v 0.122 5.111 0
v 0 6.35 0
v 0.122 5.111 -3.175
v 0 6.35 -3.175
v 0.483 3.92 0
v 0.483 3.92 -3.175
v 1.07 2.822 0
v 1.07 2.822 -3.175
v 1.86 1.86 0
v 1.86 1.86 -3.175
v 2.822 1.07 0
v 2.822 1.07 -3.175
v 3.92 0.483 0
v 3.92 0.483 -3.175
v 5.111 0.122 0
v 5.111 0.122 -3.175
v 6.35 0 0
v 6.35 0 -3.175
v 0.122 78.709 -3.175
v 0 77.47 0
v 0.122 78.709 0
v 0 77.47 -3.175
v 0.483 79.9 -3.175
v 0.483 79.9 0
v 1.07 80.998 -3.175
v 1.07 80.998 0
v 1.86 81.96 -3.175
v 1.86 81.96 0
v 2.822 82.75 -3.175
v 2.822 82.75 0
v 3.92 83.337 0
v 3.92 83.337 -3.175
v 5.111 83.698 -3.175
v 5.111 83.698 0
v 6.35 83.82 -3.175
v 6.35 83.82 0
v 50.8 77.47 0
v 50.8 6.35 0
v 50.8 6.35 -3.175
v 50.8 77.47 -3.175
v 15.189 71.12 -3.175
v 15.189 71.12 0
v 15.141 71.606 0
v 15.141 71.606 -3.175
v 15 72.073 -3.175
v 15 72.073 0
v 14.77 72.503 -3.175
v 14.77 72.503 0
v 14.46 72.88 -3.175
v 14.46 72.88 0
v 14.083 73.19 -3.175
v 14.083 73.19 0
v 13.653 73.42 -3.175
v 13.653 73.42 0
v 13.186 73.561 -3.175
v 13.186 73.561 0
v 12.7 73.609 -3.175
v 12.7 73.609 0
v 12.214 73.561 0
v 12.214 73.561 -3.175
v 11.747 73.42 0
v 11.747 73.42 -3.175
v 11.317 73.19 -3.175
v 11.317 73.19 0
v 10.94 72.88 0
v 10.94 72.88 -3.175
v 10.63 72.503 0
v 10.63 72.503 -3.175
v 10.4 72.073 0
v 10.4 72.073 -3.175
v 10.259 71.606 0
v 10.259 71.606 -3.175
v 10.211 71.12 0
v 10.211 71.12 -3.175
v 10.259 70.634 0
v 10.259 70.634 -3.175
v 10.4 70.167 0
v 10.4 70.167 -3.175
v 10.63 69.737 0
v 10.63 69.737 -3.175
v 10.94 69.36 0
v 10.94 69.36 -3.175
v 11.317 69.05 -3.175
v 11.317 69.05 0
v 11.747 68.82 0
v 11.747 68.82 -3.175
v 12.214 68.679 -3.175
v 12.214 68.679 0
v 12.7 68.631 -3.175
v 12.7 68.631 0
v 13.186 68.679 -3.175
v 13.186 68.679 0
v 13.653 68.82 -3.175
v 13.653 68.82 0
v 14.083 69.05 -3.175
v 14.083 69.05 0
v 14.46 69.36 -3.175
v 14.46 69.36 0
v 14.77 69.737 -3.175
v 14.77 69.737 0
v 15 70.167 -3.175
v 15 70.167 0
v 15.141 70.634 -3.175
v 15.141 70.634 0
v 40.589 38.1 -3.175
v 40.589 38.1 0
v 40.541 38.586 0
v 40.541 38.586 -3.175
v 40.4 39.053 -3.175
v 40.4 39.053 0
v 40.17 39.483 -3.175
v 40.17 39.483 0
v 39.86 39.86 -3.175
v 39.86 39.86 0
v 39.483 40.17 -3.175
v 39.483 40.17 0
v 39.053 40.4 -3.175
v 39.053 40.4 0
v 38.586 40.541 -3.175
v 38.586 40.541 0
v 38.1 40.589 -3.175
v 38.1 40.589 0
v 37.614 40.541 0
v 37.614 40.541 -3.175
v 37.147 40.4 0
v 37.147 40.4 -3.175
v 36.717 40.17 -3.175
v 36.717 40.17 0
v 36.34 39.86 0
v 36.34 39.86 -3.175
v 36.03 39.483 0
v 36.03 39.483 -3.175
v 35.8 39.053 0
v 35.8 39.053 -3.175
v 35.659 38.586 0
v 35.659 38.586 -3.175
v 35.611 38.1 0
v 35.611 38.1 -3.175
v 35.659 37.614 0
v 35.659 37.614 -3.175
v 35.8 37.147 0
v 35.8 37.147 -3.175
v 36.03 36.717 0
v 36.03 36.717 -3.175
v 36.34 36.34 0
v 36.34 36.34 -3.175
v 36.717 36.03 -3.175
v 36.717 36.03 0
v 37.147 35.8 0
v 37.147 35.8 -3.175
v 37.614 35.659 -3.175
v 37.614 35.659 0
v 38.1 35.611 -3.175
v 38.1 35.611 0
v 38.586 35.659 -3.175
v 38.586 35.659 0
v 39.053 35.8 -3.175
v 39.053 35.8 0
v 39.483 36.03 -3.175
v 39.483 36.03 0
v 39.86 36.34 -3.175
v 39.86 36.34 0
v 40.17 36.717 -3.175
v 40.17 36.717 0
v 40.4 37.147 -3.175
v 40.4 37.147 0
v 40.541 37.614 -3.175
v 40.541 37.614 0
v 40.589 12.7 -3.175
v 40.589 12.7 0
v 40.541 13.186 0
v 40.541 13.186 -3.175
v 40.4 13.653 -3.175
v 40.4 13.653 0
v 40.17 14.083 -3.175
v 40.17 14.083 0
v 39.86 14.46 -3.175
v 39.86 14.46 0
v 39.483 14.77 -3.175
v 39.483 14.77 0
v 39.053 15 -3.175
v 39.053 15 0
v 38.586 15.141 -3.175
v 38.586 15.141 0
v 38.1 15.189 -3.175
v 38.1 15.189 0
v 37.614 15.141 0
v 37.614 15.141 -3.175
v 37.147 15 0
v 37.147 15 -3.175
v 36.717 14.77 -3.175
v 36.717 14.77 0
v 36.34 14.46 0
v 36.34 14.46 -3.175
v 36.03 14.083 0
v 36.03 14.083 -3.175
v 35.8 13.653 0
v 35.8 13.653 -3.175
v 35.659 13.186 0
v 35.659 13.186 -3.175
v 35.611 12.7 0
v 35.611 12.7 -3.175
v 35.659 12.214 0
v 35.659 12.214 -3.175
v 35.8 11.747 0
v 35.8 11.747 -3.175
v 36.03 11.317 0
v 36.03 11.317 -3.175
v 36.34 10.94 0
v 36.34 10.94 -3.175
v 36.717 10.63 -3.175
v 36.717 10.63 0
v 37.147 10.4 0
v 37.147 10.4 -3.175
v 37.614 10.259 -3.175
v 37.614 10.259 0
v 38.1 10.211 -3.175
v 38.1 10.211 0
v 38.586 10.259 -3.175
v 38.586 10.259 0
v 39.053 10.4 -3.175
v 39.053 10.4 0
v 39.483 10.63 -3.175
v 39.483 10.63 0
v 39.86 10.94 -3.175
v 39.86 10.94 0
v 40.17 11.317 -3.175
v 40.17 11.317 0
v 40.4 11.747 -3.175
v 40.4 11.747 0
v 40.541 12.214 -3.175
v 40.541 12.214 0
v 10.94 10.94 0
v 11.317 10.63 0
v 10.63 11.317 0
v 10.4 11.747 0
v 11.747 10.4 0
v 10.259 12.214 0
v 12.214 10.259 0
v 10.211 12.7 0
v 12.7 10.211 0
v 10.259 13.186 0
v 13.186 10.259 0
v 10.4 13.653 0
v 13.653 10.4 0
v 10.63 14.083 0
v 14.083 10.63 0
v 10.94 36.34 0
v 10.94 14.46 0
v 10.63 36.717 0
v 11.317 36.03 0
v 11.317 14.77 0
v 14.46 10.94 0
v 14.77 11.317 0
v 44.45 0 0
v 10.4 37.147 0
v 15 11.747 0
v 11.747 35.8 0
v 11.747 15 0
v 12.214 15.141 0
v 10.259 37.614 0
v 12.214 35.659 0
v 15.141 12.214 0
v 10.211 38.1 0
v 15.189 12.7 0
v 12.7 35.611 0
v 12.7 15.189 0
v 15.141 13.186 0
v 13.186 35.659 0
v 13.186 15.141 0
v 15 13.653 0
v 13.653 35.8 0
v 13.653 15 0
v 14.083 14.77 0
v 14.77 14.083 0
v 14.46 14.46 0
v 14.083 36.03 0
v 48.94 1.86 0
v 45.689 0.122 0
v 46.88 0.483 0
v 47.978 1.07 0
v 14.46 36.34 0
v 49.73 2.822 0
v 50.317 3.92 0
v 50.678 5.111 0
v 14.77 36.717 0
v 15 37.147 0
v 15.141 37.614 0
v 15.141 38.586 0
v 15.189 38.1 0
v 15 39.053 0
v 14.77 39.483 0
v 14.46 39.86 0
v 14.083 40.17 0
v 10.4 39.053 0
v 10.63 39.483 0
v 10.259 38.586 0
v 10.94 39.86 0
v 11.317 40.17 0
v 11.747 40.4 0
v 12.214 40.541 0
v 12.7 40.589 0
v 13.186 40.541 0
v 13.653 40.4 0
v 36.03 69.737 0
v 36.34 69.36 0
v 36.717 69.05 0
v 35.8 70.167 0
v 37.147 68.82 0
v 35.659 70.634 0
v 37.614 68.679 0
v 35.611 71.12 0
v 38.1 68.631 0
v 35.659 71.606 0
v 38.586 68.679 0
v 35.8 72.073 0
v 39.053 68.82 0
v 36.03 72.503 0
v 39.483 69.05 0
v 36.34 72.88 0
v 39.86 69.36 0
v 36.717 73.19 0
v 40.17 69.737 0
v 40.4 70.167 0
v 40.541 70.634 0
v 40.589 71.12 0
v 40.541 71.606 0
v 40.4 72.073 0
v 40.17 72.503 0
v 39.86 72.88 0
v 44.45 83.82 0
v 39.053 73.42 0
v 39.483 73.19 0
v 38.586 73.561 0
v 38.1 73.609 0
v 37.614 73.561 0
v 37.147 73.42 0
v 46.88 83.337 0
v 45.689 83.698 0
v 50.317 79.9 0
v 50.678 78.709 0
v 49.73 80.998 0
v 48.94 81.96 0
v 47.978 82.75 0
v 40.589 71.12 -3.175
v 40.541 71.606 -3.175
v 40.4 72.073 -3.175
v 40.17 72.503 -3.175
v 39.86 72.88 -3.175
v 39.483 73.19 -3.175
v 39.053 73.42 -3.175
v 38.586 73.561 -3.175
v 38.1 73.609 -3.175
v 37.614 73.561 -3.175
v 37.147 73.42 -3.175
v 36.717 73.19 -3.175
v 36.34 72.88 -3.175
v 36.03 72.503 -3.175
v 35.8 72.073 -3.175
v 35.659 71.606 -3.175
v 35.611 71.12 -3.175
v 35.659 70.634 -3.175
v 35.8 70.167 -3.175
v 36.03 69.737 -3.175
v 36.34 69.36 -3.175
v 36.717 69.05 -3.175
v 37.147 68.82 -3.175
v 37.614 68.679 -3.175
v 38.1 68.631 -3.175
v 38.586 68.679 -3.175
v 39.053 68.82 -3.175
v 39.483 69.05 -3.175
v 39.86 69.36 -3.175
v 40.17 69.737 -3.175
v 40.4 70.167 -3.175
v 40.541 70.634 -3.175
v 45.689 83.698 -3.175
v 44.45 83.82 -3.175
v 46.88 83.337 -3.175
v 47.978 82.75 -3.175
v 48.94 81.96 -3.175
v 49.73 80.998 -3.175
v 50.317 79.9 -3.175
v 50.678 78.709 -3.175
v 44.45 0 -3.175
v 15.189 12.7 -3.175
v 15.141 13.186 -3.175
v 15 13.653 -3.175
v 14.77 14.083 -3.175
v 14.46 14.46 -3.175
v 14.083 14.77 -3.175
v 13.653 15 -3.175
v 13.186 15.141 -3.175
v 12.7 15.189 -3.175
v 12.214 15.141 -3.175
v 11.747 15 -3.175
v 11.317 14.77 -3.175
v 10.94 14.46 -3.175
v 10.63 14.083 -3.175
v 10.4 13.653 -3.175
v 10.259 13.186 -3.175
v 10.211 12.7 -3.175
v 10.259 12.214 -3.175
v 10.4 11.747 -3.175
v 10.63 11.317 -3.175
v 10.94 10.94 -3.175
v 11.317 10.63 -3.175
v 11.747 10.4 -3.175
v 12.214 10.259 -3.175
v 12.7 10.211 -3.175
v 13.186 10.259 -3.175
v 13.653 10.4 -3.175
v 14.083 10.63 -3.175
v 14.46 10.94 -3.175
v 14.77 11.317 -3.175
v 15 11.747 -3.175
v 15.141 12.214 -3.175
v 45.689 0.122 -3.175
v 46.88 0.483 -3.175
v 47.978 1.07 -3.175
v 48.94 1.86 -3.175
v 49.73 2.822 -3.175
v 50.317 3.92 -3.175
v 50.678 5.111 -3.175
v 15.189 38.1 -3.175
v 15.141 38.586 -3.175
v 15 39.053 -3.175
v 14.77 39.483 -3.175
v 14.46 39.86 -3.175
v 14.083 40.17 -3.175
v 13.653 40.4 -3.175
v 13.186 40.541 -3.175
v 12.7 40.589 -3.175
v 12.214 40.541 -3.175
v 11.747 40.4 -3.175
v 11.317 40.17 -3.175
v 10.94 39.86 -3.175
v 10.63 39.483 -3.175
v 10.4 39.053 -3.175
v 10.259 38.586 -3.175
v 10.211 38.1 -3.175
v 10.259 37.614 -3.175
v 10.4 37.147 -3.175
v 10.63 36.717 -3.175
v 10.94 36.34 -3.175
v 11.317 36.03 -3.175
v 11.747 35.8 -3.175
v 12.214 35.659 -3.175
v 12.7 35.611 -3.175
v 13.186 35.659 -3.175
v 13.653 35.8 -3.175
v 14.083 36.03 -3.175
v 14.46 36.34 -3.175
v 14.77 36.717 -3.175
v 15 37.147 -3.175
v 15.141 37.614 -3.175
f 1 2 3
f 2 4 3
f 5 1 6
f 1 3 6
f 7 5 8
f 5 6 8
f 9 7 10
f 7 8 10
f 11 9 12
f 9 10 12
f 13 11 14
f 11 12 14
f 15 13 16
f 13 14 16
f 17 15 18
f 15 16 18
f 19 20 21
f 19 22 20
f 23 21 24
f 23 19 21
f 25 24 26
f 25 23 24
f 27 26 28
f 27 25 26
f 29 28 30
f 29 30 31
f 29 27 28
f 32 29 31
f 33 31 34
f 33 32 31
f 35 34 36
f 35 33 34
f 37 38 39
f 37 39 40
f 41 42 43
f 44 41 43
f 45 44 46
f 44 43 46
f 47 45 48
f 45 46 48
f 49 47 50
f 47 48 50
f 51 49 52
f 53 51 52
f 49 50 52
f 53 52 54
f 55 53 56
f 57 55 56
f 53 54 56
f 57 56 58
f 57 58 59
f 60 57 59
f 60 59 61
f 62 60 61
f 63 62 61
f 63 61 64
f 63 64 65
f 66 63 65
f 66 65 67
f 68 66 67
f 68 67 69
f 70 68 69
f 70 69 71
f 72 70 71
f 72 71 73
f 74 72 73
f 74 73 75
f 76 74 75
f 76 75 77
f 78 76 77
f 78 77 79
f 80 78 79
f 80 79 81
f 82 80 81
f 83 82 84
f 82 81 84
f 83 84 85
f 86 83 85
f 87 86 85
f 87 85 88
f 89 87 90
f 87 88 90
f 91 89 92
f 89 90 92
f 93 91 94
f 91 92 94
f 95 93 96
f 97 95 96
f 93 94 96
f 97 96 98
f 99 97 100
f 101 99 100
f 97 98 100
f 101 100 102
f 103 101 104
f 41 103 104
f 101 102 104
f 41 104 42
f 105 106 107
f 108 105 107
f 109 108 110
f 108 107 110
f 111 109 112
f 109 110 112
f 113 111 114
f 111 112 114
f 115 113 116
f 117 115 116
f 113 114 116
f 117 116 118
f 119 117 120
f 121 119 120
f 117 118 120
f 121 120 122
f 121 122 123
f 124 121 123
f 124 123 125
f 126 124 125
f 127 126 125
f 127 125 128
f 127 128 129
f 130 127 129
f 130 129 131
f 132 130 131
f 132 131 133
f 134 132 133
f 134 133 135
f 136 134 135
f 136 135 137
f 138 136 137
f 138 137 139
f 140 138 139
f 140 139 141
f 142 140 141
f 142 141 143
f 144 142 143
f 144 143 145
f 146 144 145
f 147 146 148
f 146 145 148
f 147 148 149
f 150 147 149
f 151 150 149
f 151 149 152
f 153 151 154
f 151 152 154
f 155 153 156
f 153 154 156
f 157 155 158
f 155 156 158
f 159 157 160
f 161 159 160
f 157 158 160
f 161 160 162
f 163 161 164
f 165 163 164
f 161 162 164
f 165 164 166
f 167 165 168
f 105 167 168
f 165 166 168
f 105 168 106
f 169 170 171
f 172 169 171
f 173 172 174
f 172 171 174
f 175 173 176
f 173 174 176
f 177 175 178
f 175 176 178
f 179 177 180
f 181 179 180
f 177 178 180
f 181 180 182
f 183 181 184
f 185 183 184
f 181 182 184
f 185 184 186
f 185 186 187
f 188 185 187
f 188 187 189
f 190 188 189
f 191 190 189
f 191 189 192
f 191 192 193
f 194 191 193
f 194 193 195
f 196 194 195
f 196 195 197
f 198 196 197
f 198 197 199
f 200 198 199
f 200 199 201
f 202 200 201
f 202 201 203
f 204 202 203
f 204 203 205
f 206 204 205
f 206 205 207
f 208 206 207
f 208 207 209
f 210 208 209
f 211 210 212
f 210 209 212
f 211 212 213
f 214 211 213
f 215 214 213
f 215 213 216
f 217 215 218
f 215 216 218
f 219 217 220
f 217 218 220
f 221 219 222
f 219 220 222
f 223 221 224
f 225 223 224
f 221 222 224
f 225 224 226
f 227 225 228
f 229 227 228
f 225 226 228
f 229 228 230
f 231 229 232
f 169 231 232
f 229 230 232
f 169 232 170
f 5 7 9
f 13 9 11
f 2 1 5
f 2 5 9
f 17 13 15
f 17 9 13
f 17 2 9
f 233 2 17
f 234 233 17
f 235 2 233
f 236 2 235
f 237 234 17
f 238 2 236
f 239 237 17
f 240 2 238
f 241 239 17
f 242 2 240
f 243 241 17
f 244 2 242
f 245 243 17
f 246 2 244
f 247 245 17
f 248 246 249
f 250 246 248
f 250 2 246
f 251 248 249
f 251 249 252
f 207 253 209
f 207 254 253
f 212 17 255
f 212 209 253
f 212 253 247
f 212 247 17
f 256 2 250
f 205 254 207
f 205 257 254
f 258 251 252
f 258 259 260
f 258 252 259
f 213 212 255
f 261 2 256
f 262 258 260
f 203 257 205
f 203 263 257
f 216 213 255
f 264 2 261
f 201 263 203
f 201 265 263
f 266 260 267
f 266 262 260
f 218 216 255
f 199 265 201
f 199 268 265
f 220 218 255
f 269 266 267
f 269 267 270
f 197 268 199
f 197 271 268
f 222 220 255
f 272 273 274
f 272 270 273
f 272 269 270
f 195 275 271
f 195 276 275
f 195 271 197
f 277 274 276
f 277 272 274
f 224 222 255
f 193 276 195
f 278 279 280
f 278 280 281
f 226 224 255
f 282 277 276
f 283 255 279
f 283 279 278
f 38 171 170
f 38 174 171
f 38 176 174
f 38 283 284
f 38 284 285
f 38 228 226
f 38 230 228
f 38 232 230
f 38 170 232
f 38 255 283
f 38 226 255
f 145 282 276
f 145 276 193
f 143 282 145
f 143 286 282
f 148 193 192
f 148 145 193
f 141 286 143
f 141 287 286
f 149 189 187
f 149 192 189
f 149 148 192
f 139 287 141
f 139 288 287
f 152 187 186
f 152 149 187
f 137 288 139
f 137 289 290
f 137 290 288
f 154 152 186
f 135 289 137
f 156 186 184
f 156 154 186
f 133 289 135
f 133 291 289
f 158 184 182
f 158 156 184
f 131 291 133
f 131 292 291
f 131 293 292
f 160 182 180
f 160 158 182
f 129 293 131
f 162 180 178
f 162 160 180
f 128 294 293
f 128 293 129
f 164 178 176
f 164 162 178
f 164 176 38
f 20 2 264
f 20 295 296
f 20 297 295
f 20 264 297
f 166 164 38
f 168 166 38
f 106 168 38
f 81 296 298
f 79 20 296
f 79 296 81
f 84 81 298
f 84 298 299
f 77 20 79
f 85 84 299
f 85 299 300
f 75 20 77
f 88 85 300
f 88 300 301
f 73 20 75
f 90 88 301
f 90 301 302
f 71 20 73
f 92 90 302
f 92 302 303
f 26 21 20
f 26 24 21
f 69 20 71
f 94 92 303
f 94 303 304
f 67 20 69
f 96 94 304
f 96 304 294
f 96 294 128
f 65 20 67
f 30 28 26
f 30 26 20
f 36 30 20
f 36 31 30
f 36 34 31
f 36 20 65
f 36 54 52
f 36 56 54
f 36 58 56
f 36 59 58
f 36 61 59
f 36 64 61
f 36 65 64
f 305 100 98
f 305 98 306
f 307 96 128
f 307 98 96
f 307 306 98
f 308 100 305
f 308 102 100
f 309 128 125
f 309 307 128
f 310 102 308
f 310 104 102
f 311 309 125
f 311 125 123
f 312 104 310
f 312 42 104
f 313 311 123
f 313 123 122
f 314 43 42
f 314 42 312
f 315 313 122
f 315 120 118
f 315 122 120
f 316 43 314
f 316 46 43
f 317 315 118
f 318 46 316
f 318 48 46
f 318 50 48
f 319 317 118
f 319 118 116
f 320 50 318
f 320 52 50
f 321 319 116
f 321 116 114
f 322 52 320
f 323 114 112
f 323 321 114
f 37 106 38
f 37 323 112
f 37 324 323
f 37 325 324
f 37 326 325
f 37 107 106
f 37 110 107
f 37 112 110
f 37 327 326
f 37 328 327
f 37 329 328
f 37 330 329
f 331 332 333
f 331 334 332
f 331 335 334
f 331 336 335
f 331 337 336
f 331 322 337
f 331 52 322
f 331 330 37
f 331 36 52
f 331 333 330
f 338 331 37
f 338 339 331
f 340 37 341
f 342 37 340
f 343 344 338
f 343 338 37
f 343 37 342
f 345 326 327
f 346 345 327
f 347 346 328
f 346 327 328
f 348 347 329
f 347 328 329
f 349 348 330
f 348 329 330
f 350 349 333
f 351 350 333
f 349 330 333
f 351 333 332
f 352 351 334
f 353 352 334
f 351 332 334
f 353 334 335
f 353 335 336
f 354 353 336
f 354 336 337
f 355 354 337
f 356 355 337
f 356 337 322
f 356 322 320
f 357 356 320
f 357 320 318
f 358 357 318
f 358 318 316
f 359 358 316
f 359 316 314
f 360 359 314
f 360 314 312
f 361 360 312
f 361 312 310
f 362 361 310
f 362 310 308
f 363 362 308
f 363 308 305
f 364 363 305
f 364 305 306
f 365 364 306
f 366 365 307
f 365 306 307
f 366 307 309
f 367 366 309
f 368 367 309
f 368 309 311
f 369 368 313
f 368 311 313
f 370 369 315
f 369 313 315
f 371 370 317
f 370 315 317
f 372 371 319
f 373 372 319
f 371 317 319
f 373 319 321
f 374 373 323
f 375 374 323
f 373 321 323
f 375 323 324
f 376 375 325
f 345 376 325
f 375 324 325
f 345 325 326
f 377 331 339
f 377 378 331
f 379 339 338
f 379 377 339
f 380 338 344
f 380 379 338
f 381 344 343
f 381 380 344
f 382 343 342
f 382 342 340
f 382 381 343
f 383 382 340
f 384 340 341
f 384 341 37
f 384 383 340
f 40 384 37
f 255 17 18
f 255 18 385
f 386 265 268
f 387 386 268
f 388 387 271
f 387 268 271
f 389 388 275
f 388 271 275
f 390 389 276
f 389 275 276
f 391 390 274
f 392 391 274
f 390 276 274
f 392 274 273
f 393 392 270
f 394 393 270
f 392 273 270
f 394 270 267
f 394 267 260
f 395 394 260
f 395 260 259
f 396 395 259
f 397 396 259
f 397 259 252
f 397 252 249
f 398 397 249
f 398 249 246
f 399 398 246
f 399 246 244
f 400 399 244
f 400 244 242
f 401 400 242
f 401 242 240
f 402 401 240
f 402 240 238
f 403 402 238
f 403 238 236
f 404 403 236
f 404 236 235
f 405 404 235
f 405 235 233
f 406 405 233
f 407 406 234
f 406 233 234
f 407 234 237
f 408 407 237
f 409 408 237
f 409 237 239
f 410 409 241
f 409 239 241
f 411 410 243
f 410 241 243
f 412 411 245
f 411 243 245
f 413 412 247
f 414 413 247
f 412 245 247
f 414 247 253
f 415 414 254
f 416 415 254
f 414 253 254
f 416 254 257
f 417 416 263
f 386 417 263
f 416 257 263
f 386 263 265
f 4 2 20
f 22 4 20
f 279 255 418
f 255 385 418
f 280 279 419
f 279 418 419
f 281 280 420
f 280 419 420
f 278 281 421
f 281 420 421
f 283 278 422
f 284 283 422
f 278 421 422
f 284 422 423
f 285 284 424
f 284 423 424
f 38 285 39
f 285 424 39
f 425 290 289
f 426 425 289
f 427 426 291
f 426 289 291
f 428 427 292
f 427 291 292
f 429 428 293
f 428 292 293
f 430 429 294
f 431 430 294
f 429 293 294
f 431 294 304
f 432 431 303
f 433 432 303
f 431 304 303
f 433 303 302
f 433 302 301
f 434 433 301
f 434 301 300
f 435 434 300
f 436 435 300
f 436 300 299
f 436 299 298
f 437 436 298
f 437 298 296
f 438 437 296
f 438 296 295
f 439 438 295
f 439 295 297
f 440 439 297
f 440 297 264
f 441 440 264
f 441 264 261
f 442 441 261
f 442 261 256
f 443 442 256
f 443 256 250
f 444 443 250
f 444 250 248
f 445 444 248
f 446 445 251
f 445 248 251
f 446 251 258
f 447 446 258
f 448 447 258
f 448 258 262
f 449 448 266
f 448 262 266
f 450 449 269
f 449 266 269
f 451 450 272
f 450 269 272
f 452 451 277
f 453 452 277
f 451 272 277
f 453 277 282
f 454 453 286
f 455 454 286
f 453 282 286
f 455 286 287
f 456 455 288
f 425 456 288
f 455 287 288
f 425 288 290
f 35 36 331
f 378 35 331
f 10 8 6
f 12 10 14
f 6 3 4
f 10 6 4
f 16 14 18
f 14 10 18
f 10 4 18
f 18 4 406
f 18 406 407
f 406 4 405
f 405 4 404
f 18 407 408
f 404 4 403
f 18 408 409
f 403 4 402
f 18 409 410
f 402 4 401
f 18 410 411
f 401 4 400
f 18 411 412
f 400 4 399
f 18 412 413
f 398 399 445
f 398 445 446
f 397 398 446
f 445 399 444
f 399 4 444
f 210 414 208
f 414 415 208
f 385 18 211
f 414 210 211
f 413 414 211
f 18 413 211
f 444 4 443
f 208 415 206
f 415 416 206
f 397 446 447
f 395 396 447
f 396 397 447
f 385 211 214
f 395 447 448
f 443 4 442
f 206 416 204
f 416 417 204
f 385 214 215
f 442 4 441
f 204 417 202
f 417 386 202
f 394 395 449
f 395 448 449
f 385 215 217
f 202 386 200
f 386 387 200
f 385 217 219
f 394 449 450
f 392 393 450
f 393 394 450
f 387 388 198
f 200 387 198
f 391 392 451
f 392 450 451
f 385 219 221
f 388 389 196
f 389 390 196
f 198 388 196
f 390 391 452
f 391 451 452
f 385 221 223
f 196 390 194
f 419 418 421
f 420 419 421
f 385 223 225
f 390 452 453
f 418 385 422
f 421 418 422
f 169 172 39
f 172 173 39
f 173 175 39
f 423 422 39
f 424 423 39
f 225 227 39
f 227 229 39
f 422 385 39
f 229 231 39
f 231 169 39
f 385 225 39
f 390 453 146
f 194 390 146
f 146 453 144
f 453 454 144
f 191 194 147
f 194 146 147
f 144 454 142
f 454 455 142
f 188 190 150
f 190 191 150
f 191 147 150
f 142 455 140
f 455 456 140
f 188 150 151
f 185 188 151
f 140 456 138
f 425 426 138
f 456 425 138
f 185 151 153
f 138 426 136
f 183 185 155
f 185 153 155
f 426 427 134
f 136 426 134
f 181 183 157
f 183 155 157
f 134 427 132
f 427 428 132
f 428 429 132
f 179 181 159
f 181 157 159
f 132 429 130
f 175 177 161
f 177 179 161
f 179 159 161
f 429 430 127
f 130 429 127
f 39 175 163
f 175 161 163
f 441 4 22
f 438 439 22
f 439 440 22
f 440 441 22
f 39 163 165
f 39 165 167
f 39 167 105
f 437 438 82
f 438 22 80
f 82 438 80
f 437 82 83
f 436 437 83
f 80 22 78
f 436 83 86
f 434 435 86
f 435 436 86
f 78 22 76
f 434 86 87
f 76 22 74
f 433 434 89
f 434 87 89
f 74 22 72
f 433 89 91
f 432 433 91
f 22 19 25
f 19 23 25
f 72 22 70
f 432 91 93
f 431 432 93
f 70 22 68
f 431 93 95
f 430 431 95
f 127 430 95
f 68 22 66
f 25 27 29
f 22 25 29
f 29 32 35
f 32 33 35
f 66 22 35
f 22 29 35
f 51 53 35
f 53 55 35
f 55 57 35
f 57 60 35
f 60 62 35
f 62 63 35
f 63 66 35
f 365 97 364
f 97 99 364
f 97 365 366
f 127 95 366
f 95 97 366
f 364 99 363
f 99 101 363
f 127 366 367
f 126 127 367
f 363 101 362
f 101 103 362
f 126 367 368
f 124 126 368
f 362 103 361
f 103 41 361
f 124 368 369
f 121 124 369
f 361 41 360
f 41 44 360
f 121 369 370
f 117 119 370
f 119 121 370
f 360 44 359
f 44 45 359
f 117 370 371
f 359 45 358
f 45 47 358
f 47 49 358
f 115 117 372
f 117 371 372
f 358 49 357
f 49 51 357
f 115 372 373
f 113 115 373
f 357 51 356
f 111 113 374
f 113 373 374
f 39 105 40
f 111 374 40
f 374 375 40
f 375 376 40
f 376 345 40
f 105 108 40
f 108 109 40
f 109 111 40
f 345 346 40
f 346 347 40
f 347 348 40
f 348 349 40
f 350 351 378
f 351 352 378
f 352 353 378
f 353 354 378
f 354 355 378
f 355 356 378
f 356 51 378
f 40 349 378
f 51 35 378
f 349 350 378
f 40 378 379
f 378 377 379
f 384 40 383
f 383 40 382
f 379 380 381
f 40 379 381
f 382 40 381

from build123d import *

# Parameters (mm, degrees)
SKETCH2_W           = 50.8
SKETCH2_H           = 83.82
BOSS_EXTRUDE1_DEPTH = 3.175
SKETCH3_R           = 2.4892
CUT_EXTRUDE1_DEPTH  = 99.063821183
FILLET1_R           = 6.35


with BuildPart() as part:
    # Sketch2 → Boss-Extrude1 (new body)
    with BuildSketch(Plane.XY):
        with Locations((25.4, 41.91)):
            Rectangle(SKETCH2_W, SKETCH2_H)
    extrude(amount=-BOSS_EXTRUDE1_DEPTH)

    # Sketch3 → Cut-Extrude1 (cut, through all)
    with BuildSketch(Plane.XY):
        with Locations((12.7, 71.12)):
            Circle(SKETCH3_R)
        with Locations((38.1, 71.12)):
            Circle(SKETCH3_R)
        with Locations((12.7, 38.1)):
            Circle(SKETCH3_R)
        with Locations((12.7, 12.7)):
            Circle(SKETCH3_R)
        with Locations((12.7, -12.7)):
            Circle(SKETCH3_R)
        with Locations((12.7, -38.1)):
            Circle(SKETCH3_R)
        with Locations((12.7, -63.5)):
            Circle(SKETCH3_R)
        with Locations((38.1, 12.7)):
            Circle(SKETCH3_R)
        with Locations((38.1, -12.7)):
            Circle(SKETCH3_R)
        with Locations((38.1, -38.1)):
            Circle(SKETCH3_R)
        with Locations((38.1, -63.5)):
            Circle(SKETCH3_R)
        with Locations((38.1, 38.1)):
            Circle(SKETCH3_R)
    extrude(amount=-CUT_EXTRUDE1_DEPTH, mode=Mode.SUBTRACT)

    # Fillet1
    fillet1_edges = [part.edges().sort_by_distance(p)[0] for p in [
        (0, 83.82, -1.5875),
        (50.8, 83.82, -1.5875),
        (50.8, 0, -1.5875),
        (0, 0, -1.5875),
    ]]
    fillet(fillet1_edges, radius=FILLET1_R)


solid = part.part
